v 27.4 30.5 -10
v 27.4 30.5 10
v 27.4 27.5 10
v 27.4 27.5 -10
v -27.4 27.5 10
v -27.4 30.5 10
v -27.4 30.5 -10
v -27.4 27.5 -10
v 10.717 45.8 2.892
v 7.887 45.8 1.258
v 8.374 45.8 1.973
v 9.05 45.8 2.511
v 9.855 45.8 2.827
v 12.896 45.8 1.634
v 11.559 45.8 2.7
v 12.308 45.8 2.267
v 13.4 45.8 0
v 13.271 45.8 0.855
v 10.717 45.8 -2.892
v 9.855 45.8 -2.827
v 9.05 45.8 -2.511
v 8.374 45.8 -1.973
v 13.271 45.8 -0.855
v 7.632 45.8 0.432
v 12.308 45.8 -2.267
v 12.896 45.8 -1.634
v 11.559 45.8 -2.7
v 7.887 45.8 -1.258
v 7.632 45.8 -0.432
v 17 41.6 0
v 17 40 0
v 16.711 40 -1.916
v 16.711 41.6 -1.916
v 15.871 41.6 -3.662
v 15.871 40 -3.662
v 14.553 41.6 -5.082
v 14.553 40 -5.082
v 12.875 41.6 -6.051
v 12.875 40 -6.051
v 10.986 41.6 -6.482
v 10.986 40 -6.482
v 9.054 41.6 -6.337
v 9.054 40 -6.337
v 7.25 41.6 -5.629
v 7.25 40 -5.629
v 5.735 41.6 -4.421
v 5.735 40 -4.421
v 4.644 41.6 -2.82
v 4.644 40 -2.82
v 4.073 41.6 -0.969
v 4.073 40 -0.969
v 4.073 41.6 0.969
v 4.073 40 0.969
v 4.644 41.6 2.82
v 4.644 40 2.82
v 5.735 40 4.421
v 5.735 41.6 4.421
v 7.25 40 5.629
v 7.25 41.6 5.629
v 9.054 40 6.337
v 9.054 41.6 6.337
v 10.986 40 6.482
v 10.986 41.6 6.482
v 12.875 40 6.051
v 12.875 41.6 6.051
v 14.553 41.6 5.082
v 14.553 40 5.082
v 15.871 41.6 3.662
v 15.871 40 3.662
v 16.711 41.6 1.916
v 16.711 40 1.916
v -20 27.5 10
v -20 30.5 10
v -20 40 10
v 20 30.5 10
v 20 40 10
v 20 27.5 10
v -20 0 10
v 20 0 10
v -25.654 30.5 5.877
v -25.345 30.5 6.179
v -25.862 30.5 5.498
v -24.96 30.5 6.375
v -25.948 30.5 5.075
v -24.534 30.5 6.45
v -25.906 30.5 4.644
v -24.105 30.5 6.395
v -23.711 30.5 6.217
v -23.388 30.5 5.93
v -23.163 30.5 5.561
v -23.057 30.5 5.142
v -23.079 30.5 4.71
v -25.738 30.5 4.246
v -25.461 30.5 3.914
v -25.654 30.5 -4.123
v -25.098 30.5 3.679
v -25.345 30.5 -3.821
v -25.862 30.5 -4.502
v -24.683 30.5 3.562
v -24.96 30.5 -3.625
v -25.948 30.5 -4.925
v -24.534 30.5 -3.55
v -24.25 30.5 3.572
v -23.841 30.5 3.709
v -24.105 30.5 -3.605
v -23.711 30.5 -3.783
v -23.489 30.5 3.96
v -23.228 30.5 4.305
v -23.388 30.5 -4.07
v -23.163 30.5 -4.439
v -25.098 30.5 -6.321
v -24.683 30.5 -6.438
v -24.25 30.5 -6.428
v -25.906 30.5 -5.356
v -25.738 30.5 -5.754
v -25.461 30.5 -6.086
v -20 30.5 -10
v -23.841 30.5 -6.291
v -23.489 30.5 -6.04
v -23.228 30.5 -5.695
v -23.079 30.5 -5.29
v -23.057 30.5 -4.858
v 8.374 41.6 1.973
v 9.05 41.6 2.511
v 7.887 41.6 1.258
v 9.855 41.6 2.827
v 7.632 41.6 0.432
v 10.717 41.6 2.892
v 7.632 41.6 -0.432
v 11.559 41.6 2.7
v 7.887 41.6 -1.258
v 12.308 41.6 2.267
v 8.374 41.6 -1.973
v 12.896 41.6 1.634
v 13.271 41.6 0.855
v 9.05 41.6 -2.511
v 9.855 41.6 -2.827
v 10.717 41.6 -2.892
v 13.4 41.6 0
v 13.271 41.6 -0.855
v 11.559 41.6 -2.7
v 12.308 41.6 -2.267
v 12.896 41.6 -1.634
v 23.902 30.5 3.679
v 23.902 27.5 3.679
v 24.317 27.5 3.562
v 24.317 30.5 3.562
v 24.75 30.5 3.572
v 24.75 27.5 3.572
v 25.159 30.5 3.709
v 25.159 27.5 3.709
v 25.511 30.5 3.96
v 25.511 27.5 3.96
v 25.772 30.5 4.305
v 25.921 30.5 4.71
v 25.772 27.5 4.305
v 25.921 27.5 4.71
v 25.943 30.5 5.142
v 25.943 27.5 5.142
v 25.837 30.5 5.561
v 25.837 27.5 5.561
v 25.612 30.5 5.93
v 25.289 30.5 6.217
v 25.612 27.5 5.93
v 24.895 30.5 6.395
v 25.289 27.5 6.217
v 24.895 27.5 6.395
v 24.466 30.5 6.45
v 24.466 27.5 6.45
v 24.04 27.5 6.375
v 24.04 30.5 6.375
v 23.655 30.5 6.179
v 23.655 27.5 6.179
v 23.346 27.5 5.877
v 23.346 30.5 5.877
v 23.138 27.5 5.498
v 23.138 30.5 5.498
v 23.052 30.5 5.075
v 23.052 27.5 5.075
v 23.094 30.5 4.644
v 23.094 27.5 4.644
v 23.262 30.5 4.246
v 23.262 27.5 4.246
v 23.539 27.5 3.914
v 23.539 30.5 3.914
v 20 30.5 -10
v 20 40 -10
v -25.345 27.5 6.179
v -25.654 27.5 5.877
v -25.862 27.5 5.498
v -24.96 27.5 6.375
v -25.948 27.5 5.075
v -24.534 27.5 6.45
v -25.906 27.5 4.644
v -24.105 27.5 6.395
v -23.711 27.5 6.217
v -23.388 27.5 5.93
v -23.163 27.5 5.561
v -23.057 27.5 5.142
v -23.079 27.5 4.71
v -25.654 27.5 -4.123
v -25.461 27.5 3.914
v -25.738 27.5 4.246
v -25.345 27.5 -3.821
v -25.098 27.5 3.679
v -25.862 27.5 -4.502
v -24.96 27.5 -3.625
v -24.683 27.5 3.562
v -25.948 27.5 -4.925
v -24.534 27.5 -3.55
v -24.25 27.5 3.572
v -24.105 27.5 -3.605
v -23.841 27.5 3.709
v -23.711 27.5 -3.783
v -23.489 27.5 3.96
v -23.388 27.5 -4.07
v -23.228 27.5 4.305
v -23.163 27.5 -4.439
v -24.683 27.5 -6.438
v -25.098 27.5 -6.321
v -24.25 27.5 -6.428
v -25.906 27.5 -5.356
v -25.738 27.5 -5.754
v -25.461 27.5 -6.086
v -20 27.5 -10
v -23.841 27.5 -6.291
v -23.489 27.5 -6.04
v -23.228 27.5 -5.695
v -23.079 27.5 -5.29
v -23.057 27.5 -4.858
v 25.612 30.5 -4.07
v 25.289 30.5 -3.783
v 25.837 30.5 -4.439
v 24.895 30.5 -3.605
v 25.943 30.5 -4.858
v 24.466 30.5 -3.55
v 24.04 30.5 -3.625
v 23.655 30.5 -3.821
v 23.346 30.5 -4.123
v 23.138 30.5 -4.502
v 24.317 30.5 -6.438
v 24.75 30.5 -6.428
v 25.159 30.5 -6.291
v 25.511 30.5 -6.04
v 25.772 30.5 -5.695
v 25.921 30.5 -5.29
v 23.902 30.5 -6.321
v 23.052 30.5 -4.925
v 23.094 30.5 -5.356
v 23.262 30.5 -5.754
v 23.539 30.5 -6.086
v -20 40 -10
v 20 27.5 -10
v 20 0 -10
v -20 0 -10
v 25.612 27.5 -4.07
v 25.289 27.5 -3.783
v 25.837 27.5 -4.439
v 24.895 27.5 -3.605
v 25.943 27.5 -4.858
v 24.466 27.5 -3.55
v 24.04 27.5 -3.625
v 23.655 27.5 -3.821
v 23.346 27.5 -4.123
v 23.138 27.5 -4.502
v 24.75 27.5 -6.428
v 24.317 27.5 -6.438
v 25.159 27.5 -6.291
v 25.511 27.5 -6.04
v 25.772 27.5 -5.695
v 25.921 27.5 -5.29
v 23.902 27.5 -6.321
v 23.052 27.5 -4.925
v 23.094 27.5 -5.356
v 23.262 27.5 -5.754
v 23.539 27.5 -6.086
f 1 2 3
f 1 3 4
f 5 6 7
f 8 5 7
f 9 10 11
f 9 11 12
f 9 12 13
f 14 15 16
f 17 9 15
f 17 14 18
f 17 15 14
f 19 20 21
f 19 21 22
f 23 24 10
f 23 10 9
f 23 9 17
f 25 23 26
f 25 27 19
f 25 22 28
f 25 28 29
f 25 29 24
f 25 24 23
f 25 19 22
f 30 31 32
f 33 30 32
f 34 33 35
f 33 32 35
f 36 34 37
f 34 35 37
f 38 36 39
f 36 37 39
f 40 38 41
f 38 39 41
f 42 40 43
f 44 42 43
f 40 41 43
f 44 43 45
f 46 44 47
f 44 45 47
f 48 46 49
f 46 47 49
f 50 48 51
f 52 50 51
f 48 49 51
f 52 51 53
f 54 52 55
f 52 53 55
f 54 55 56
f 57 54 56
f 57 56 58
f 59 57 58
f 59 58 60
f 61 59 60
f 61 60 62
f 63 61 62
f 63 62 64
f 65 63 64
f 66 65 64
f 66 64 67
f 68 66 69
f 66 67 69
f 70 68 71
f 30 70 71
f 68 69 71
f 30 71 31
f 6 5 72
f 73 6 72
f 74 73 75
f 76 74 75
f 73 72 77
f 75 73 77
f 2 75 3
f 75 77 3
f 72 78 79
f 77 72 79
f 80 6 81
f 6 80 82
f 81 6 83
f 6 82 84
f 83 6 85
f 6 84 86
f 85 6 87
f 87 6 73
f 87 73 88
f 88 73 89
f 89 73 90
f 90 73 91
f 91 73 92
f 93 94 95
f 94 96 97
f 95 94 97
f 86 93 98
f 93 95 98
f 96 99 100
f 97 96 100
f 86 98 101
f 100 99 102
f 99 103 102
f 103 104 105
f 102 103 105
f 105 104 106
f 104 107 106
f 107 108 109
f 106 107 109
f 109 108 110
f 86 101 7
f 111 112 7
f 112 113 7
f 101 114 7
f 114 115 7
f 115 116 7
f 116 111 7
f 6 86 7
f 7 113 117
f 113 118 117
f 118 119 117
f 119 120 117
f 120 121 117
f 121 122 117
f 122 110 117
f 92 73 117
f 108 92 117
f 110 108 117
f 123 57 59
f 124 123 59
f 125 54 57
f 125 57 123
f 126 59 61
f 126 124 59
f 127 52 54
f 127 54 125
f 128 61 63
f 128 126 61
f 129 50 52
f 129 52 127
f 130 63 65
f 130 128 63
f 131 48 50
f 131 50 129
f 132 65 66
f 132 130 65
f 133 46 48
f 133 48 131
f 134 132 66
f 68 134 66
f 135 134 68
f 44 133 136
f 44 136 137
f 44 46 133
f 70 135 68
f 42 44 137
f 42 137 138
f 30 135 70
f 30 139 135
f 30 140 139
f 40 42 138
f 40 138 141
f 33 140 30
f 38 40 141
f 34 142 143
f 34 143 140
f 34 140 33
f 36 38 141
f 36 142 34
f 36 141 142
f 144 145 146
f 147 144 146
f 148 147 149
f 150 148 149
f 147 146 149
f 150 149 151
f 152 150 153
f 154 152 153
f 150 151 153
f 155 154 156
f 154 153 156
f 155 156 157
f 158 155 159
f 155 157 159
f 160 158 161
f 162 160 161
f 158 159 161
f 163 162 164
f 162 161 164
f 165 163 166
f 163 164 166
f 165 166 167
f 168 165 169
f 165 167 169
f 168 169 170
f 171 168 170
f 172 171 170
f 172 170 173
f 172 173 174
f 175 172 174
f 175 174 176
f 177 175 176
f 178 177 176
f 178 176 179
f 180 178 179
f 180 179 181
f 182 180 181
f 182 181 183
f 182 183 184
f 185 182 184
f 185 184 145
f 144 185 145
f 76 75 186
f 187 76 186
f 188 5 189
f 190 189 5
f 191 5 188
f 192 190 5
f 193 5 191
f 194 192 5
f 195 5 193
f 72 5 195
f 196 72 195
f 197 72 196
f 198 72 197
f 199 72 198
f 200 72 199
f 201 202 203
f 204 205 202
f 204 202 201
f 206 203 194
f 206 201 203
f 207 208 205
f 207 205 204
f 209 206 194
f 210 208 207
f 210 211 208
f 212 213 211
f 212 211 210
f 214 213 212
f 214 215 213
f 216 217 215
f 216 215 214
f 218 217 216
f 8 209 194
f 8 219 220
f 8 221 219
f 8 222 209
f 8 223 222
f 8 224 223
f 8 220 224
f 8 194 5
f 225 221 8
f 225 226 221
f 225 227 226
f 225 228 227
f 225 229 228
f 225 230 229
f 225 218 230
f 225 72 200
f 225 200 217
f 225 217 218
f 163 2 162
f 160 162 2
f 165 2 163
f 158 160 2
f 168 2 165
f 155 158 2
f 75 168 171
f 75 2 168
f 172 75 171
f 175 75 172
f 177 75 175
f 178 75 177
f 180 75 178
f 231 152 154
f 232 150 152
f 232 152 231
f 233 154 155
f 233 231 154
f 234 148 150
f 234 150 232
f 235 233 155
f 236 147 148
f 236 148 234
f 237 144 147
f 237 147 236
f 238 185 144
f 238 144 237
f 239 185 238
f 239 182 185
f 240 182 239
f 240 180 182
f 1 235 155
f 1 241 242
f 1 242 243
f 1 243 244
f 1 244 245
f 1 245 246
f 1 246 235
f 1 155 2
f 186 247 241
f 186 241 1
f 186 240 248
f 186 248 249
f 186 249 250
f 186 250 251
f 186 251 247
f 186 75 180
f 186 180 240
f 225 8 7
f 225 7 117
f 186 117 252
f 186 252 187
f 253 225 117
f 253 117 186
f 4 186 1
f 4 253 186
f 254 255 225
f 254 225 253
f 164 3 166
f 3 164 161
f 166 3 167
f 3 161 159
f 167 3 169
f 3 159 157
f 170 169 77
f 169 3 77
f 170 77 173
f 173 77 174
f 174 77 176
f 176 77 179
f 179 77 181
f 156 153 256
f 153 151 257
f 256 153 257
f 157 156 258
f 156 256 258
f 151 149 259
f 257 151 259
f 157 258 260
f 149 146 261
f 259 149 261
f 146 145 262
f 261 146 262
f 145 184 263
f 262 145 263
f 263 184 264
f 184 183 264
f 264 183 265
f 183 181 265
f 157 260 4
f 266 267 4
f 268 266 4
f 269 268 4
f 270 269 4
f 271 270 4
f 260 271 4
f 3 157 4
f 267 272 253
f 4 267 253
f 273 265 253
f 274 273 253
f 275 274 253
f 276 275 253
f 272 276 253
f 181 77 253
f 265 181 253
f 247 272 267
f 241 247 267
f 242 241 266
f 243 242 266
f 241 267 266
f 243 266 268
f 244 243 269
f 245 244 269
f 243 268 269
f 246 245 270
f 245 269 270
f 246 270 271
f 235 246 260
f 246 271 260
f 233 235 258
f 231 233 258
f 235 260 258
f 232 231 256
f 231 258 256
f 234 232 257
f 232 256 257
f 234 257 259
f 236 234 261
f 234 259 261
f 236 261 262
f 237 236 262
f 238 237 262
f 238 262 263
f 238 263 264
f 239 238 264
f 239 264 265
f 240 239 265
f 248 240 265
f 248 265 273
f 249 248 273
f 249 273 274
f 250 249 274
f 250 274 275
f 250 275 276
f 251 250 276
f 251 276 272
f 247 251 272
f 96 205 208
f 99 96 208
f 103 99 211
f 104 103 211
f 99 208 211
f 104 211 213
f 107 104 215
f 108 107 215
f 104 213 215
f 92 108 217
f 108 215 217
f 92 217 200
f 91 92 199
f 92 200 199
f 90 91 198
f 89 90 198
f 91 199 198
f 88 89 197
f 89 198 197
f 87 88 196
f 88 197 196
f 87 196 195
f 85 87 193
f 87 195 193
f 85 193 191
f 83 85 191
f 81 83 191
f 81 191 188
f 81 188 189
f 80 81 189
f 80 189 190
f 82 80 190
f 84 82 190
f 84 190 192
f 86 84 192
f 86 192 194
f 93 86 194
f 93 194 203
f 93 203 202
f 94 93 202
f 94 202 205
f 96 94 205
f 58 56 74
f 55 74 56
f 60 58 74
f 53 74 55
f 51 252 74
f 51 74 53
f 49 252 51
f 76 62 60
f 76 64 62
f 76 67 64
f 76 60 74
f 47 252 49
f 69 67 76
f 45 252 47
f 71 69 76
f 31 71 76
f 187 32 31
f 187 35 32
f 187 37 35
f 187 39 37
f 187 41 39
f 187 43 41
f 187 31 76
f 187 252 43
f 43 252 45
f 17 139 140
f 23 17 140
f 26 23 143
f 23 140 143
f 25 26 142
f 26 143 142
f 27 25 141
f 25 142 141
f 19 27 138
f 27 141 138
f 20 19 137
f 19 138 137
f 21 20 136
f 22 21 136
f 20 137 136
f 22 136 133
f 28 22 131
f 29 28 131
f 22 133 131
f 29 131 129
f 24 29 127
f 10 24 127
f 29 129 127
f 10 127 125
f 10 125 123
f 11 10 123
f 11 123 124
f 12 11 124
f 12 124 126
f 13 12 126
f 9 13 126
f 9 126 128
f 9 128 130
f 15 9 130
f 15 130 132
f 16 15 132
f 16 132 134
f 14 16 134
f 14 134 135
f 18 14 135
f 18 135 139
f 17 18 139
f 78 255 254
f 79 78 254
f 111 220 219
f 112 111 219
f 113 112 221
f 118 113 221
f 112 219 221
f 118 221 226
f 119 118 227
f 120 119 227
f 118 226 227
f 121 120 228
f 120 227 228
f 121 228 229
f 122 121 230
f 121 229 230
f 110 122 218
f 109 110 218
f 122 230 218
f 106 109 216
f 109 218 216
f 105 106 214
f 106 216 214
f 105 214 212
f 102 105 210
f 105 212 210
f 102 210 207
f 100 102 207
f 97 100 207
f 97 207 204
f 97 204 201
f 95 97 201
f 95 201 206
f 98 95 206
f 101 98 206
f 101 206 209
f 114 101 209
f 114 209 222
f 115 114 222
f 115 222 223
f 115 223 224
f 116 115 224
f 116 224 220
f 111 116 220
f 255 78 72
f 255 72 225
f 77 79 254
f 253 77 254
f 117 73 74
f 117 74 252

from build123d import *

# Parameters (mm, degrees)
SKETCH1_W                  = 40
SKETCH1_H                  = 20
BOSS_EXTRUDE1_DEPTH        = 40
SKETCH2_W                  = 20
SKETCH2_H                  = 3
BOSS_EXTRUDE2_DEPTH        = 7.4
SKETCH3_R                  = 2.9
BOSS_EXTRUDE3_DEPTH        = 5.8
SKETCH5_R                  = 6.5
BOSS_EXTRUDE4_DEPTH        = 1.6
M2_5_CLEARANCE_SLOT1_D     = 2.9
M2_5_CLEARANCE_SLOT1_DEPTH = 8.999
M2_5_CLEARANCE_SLOT1_TIP   = 0.871247898


with BuildPart() as part:
    # Sketch1 → Boss-Extrude1 (new body)
    with BuildSketch(Plane(origin=(0, 0, 0), x_dir=(1, 0, 0), z_dir=(0, 1, 0))):
        Rectangle(SKETCH1_W, SKETCH1_H)
    extrude(amount=BOSS_EXTRUDE1_DEPTH)

    # Sketch2 → Boss-Extrude2 (add)
    with BuildSketch(Plane(origin=(20, 0, 0), x_dir=(0, 0, -1), z_dir=(1, 0, 0))):
        with Locations((0, 29)):
            Rectangle(SKETCH2_W, SKETCH2_H)
    boss_extrude2 = extrude(amount=BOSS_EXTRUDE2_DEPTH)

    # Mirror1: Boss-Extrude2 across plane
    add(boss_extrude2.mirror(Plane(origin=(0, 0, 0), x_dir=(0, 0, 1), z_dir=(1, 0, 0))))

    # Sketch3 → Boss-Extrude3 (add)
    with BuildSketch(Plane(origin=(0, 40, 0), x_dir=(1, 0, 0), z_dir=(0, 1, 0))):
        with Locations((10.5, 0)):
            Circle(SKETCH3_R)
    extrude(amount=BOSS_EXTRUDE3_DEPTH)

    # Sketch5 → Boss-Extrude4 (add)
    with BuildSketch(Plane(origin=(0, 40, 0), x_dir=(1, 0, 0), z_dir=(0, 1, 0))):
        with Locations((10.5, 0)):
            Circle(SKETCH5_R)
    extrude(amount=BOSS_EXTRUDE4_DEPTH)

    # M2.5 Clearance Slot1
    with Locations(Plane(origin=(-162.114339431, 30.5, -5.431907662), x_dir=(0.412719532, 0, 0.91085816), z_dir=(0, 1, 0))):
        with Locations((57.189532403, 125.168887287), (66.298114004, 121.041691966), (77.412789478, 169.800937131), (86.521371079, 165.67374181)):
            Hole(M2_5_CLEARANCE_SLOT1_D / 2, depth=M2_5_CLEARANCE_SLOT1_DEPTH)
            with Locations((0, 0, -(M2_5_CLEARANCE_SLOT1_DEPTH + M2_5_CLEARANCE_SLOT1_TIP / 2))):  # 118° drill point
                Cone(0, M2_5_CLEARANCE_SLOT1_D / 2, M2_5_CLEARANCE_SLOT1_TIP, mode=Mode.SUBTRACT)


solid = part.part
